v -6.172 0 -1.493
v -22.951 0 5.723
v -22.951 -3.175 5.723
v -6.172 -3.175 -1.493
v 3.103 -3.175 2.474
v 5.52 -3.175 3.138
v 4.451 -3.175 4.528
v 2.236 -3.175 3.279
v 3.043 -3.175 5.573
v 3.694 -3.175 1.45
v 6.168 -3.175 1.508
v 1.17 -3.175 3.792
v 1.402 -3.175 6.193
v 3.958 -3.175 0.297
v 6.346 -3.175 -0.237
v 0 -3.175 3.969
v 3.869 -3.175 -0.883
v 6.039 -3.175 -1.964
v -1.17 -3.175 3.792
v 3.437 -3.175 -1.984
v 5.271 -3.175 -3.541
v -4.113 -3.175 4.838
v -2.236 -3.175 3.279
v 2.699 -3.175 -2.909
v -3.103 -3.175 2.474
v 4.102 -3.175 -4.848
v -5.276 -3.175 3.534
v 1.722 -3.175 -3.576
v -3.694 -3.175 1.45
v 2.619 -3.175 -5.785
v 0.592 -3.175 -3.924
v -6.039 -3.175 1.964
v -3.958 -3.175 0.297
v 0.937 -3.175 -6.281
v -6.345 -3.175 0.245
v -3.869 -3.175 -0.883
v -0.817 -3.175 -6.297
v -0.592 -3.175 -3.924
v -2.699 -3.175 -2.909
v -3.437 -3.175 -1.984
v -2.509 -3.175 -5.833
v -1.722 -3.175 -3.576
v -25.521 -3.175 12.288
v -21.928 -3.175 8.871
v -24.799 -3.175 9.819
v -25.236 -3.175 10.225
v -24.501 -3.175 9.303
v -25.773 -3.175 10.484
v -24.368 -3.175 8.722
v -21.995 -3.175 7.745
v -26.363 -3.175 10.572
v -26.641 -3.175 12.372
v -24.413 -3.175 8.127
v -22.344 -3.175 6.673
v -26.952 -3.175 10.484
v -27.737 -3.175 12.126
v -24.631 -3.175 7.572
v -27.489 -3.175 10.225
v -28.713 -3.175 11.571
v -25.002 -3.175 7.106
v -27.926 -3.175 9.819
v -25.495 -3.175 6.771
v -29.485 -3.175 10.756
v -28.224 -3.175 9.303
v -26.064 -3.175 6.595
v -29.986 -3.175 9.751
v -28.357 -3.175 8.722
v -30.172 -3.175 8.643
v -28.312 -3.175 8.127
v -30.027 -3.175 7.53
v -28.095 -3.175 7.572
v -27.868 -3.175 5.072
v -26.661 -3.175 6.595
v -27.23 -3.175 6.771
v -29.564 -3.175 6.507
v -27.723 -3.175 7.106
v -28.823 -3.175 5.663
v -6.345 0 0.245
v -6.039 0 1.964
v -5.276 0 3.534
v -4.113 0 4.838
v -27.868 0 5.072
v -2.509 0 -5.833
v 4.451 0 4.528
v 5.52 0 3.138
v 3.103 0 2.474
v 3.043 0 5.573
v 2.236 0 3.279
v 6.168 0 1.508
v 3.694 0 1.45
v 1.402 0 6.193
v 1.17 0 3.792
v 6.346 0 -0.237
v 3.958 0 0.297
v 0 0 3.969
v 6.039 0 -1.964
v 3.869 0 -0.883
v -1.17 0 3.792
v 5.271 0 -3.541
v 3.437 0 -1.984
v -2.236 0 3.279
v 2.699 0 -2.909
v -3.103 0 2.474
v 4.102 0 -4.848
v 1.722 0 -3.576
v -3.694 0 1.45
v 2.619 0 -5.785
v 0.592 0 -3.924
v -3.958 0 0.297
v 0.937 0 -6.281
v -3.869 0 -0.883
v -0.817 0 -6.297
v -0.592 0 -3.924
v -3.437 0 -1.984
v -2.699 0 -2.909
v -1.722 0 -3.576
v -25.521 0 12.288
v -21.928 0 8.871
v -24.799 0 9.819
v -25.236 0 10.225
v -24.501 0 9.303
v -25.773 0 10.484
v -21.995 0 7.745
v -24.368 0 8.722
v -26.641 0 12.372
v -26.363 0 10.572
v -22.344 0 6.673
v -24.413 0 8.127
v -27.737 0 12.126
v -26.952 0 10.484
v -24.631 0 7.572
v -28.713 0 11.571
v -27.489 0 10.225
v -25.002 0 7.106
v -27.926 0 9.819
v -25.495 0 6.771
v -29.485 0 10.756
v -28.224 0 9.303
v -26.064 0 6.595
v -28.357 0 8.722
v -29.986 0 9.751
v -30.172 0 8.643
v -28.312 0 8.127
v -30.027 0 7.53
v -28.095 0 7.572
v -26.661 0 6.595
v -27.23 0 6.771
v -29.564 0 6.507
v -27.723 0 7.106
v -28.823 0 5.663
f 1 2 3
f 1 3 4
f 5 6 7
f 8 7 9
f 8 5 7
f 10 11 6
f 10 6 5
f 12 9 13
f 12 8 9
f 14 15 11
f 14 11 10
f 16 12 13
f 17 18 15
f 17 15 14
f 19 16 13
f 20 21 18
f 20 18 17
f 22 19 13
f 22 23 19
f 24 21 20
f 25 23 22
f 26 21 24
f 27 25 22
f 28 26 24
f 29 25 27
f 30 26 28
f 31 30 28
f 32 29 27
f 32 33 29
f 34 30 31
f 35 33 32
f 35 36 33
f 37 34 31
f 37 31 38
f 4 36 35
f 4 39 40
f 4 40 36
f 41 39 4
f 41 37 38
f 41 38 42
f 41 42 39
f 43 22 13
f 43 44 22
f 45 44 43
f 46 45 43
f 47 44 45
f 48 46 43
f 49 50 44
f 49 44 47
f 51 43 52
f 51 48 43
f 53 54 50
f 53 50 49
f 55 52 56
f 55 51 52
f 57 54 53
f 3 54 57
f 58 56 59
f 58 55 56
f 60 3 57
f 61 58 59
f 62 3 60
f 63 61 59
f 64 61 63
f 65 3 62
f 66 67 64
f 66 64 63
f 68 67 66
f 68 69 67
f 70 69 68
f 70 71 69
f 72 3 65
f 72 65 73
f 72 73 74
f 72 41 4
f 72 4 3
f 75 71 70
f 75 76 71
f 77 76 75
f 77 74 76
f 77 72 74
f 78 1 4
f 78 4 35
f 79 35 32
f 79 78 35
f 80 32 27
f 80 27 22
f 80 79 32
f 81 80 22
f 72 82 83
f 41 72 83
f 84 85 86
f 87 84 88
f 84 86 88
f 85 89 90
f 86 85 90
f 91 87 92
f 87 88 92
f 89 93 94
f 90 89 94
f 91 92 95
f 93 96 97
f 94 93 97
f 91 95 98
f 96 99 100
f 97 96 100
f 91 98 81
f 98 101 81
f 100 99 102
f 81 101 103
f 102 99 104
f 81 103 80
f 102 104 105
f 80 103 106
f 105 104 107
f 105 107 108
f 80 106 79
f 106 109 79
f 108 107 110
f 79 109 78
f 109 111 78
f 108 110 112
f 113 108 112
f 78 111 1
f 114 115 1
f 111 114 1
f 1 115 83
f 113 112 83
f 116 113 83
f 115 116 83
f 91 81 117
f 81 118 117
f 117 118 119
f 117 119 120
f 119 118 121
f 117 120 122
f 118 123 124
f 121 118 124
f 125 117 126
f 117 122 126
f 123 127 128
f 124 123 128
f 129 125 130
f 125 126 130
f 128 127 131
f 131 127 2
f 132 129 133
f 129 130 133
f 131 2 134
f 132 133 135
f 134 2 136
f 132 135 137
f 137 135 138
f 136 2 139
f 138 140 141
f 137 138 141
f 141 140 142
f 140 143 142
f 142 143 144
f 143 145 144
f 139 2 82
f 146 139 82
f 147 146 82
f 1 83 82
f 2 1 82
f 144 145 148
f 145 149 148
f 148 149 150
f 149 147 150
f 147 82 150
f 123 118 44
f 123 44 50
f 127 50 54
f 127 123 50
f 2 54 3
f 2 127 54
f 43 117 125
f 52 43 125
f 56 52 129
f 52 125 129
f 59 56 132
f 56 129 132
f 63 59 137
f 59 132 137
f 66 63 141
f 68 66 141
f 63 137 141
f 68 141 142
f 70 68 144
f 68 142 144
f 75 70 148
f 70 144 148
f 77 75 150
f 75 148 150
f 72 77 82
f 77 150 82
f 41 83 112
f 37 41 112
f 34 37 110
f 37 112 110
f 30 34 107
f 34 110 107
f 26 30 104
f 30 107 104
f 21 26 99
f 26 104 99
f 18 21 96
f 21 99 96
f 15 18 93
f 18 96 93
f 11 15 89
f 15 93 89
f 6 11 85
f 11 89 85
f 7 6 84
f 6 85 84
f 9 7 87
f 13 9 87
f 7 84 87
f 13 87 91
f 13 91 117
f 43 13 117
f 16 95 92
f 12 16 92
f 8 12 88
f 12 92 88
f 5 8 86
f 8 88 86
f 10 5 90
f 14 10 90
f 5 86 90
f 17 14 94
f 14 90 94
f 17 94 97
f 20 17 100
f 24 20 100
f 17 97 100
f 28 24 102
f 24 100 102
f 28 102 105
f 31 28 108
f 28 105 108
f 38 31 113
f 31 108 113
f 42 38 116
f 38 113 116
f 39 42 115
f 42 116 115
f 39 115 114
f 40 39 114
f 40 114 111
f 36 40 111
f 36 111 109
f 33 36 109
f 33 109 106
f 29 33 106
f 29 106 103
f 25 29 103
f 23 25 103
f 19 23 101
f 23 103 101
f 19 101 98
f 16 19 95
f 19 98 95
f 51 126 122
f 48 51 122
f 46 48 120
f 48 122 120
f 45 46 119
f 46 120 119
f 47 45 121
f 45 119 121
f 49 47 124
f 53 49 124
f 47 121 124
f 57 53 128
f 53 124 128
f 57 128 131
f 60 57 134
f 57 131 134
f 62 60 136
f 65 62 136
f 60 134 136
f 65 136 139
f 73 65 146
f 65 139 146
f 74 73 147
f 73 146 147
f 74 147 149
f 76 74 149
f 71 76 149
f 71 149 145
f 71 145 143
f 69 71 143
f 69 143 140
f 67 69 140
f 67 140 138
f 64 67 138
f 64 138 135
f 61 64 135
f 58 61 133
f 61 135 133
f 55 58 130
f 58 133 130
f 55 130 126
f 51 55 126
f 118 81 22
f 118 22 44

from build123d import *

# Parameters (mm, degrees)
SKETCH1_R           = 3.96875
SKETCH1_R_2         = 2
BOSS_EXTRUDE1_DEPTH = 3.175


with BuildPart() as part:
    # Sketch1 → Boss-Extrude1 (new body)
    with BuildSketch(Plane(origin=(0, 0, 0), x_dir=(1, 0, 0), z_dir=(0, 1, 0))):
        with BuildLine():
            Line((1.402094694, -6.193273001), (-25.521322666, -12.288463801))
            ThreePointArc((-25.521322666, -12.288463801), (-29.985830904, -9.750697408), (-27.867805259, -5.07244352))
            Line((-27.867805259, -5.07244352), (-2.508709628, 5.833427466))
            ThreePointArc((-2.508709628, 5.833427466), (6.03875237, 1.963662347), (1.402094694, -6.193273001))
        make_face()
        with Locations(Location((0, 0, 0), (0, 0, 270))):
            Circle(SKETCH1_R, mode=Mode.SUBTRACT)
        with Locations(Location((-26.362579482, -8.5725, 0), (0, 0, 270))):
            Circle(SKETCH1_R_2, mode=Mode.SUBTRACT)
        with BuildLine():
            Line((-4.113361585, -4.837639556), (-21.927586713, -8.870600886))
            ThreePointArc((-21.927586713, -8.870600886), (-22.135452823, -7.197936357), (-22.951139301, -5.722920928))
            Line((-22.951139301, -5.722920928), (-6.17196775, 1.493088778))
            ThreePointArc((-6.17196775, 1.493088778), (-6.03875237, -1.963662347), (-4.113361585, -4.837639556))
        make_face(mode=Mode.SUBTRACT)
    extrude(amount=-BOSS_EXTRUDE1_DEPTH)


solid = part.part
